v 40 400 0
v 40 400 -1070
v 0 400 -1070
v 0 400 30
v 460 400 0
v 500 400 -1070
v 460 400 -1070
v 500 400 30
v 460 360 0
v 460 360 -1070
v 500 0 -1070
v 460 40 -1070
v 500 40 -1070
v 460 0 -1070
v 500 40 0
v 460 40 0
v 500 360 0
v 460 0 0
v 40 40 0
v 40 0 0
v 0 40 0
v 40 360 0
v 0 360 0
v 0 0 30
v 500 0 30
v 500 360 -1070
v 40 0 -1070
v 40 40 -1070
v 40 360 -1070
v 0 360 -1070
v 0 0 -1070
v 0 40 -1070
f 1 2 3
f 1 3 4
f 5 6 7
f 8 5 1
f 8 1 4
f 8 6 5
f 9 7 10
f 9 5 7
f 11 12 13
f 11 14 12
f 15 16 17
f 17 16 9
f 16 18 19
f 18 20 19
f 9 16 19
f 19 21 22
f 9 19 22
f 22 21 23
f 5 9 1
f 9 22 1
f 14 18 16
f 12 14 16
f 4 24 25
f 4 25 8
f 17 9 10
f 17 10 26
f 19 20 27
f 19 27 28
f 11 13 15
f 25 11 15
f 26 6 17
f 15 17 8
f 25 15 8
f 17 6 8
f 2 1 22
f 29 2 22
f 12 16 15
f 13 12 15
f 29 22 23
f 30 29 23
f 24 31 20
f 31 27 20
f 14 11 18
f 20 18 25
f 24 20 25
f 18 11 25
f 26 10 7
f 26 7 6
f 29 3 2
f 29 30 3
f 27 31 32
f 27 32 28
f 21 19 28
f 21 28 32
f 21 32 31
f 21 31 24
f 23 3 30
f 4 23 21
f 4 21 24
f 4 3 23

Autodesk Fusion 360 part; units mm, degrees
box "PrimitivaParallelepipedo1" add length 400 width 500 height 30 placed x (0, 1, 0) y (-1, 0, 0) z (0, 0, 1) at (500, 0, 0)
sketch "Schizzo2" plane through (0, 0, 0) normal (0, 0, -1) x (1, 0, 0)
  line L0 (0, -400) -> (500, -400)
  line L1 (500, -400) -> (500, 0)
  line L2 (500, 0) -> (0, 0)
  line L3 (0, 0) -> (0, -400)
  line L4 (0, 0) -> (40, 0)
  line L5 (40, 0) -> (40, -40)
  line L6 (40, -40) -> (0, -40)
  line L7 (0, -40) -> (0, 0)
  line L8 (500, 0) -> (460, 0)
  line L9 (460, 0) -> (460, -40)
  line L10 (460, -40) -> (500, -40)
  line L11 (500, -40) -> (500, 0)
  line L12 (500, -400) -> (460, -400)
  line L13 (460, -400) -> (460, -360)
  line L14 (460, -360) -> (500, -360)
  line L15 (500, -360) -> (500, -400)
  line L16 (0, -400) -> (40, -400)
  line L17 (40, -400) -> (40, -360)
  line L18 (40, -360) -> (0, -360)
  line L19 (0, -360) -> (0, -400)
  dimension "d6" = 40
  dimension "d7" = 40
  dimension "d8" = 40
  dimension "d9" = 40
extrude "Estrusione1" add sketch "Schizzo2" along normal blind 1070 contours L0 L3 L16 L17 L18 L19 | L0 L1 L12 L13 L14 L15 | L2 L3 L4 L5 L6 L7 | L1 L2 L8 L9 L10 L11
component "Component" placed x (1, 0, 0) y (0, 1, 0) z (0, 0, 1) at (0, 0, 0)
